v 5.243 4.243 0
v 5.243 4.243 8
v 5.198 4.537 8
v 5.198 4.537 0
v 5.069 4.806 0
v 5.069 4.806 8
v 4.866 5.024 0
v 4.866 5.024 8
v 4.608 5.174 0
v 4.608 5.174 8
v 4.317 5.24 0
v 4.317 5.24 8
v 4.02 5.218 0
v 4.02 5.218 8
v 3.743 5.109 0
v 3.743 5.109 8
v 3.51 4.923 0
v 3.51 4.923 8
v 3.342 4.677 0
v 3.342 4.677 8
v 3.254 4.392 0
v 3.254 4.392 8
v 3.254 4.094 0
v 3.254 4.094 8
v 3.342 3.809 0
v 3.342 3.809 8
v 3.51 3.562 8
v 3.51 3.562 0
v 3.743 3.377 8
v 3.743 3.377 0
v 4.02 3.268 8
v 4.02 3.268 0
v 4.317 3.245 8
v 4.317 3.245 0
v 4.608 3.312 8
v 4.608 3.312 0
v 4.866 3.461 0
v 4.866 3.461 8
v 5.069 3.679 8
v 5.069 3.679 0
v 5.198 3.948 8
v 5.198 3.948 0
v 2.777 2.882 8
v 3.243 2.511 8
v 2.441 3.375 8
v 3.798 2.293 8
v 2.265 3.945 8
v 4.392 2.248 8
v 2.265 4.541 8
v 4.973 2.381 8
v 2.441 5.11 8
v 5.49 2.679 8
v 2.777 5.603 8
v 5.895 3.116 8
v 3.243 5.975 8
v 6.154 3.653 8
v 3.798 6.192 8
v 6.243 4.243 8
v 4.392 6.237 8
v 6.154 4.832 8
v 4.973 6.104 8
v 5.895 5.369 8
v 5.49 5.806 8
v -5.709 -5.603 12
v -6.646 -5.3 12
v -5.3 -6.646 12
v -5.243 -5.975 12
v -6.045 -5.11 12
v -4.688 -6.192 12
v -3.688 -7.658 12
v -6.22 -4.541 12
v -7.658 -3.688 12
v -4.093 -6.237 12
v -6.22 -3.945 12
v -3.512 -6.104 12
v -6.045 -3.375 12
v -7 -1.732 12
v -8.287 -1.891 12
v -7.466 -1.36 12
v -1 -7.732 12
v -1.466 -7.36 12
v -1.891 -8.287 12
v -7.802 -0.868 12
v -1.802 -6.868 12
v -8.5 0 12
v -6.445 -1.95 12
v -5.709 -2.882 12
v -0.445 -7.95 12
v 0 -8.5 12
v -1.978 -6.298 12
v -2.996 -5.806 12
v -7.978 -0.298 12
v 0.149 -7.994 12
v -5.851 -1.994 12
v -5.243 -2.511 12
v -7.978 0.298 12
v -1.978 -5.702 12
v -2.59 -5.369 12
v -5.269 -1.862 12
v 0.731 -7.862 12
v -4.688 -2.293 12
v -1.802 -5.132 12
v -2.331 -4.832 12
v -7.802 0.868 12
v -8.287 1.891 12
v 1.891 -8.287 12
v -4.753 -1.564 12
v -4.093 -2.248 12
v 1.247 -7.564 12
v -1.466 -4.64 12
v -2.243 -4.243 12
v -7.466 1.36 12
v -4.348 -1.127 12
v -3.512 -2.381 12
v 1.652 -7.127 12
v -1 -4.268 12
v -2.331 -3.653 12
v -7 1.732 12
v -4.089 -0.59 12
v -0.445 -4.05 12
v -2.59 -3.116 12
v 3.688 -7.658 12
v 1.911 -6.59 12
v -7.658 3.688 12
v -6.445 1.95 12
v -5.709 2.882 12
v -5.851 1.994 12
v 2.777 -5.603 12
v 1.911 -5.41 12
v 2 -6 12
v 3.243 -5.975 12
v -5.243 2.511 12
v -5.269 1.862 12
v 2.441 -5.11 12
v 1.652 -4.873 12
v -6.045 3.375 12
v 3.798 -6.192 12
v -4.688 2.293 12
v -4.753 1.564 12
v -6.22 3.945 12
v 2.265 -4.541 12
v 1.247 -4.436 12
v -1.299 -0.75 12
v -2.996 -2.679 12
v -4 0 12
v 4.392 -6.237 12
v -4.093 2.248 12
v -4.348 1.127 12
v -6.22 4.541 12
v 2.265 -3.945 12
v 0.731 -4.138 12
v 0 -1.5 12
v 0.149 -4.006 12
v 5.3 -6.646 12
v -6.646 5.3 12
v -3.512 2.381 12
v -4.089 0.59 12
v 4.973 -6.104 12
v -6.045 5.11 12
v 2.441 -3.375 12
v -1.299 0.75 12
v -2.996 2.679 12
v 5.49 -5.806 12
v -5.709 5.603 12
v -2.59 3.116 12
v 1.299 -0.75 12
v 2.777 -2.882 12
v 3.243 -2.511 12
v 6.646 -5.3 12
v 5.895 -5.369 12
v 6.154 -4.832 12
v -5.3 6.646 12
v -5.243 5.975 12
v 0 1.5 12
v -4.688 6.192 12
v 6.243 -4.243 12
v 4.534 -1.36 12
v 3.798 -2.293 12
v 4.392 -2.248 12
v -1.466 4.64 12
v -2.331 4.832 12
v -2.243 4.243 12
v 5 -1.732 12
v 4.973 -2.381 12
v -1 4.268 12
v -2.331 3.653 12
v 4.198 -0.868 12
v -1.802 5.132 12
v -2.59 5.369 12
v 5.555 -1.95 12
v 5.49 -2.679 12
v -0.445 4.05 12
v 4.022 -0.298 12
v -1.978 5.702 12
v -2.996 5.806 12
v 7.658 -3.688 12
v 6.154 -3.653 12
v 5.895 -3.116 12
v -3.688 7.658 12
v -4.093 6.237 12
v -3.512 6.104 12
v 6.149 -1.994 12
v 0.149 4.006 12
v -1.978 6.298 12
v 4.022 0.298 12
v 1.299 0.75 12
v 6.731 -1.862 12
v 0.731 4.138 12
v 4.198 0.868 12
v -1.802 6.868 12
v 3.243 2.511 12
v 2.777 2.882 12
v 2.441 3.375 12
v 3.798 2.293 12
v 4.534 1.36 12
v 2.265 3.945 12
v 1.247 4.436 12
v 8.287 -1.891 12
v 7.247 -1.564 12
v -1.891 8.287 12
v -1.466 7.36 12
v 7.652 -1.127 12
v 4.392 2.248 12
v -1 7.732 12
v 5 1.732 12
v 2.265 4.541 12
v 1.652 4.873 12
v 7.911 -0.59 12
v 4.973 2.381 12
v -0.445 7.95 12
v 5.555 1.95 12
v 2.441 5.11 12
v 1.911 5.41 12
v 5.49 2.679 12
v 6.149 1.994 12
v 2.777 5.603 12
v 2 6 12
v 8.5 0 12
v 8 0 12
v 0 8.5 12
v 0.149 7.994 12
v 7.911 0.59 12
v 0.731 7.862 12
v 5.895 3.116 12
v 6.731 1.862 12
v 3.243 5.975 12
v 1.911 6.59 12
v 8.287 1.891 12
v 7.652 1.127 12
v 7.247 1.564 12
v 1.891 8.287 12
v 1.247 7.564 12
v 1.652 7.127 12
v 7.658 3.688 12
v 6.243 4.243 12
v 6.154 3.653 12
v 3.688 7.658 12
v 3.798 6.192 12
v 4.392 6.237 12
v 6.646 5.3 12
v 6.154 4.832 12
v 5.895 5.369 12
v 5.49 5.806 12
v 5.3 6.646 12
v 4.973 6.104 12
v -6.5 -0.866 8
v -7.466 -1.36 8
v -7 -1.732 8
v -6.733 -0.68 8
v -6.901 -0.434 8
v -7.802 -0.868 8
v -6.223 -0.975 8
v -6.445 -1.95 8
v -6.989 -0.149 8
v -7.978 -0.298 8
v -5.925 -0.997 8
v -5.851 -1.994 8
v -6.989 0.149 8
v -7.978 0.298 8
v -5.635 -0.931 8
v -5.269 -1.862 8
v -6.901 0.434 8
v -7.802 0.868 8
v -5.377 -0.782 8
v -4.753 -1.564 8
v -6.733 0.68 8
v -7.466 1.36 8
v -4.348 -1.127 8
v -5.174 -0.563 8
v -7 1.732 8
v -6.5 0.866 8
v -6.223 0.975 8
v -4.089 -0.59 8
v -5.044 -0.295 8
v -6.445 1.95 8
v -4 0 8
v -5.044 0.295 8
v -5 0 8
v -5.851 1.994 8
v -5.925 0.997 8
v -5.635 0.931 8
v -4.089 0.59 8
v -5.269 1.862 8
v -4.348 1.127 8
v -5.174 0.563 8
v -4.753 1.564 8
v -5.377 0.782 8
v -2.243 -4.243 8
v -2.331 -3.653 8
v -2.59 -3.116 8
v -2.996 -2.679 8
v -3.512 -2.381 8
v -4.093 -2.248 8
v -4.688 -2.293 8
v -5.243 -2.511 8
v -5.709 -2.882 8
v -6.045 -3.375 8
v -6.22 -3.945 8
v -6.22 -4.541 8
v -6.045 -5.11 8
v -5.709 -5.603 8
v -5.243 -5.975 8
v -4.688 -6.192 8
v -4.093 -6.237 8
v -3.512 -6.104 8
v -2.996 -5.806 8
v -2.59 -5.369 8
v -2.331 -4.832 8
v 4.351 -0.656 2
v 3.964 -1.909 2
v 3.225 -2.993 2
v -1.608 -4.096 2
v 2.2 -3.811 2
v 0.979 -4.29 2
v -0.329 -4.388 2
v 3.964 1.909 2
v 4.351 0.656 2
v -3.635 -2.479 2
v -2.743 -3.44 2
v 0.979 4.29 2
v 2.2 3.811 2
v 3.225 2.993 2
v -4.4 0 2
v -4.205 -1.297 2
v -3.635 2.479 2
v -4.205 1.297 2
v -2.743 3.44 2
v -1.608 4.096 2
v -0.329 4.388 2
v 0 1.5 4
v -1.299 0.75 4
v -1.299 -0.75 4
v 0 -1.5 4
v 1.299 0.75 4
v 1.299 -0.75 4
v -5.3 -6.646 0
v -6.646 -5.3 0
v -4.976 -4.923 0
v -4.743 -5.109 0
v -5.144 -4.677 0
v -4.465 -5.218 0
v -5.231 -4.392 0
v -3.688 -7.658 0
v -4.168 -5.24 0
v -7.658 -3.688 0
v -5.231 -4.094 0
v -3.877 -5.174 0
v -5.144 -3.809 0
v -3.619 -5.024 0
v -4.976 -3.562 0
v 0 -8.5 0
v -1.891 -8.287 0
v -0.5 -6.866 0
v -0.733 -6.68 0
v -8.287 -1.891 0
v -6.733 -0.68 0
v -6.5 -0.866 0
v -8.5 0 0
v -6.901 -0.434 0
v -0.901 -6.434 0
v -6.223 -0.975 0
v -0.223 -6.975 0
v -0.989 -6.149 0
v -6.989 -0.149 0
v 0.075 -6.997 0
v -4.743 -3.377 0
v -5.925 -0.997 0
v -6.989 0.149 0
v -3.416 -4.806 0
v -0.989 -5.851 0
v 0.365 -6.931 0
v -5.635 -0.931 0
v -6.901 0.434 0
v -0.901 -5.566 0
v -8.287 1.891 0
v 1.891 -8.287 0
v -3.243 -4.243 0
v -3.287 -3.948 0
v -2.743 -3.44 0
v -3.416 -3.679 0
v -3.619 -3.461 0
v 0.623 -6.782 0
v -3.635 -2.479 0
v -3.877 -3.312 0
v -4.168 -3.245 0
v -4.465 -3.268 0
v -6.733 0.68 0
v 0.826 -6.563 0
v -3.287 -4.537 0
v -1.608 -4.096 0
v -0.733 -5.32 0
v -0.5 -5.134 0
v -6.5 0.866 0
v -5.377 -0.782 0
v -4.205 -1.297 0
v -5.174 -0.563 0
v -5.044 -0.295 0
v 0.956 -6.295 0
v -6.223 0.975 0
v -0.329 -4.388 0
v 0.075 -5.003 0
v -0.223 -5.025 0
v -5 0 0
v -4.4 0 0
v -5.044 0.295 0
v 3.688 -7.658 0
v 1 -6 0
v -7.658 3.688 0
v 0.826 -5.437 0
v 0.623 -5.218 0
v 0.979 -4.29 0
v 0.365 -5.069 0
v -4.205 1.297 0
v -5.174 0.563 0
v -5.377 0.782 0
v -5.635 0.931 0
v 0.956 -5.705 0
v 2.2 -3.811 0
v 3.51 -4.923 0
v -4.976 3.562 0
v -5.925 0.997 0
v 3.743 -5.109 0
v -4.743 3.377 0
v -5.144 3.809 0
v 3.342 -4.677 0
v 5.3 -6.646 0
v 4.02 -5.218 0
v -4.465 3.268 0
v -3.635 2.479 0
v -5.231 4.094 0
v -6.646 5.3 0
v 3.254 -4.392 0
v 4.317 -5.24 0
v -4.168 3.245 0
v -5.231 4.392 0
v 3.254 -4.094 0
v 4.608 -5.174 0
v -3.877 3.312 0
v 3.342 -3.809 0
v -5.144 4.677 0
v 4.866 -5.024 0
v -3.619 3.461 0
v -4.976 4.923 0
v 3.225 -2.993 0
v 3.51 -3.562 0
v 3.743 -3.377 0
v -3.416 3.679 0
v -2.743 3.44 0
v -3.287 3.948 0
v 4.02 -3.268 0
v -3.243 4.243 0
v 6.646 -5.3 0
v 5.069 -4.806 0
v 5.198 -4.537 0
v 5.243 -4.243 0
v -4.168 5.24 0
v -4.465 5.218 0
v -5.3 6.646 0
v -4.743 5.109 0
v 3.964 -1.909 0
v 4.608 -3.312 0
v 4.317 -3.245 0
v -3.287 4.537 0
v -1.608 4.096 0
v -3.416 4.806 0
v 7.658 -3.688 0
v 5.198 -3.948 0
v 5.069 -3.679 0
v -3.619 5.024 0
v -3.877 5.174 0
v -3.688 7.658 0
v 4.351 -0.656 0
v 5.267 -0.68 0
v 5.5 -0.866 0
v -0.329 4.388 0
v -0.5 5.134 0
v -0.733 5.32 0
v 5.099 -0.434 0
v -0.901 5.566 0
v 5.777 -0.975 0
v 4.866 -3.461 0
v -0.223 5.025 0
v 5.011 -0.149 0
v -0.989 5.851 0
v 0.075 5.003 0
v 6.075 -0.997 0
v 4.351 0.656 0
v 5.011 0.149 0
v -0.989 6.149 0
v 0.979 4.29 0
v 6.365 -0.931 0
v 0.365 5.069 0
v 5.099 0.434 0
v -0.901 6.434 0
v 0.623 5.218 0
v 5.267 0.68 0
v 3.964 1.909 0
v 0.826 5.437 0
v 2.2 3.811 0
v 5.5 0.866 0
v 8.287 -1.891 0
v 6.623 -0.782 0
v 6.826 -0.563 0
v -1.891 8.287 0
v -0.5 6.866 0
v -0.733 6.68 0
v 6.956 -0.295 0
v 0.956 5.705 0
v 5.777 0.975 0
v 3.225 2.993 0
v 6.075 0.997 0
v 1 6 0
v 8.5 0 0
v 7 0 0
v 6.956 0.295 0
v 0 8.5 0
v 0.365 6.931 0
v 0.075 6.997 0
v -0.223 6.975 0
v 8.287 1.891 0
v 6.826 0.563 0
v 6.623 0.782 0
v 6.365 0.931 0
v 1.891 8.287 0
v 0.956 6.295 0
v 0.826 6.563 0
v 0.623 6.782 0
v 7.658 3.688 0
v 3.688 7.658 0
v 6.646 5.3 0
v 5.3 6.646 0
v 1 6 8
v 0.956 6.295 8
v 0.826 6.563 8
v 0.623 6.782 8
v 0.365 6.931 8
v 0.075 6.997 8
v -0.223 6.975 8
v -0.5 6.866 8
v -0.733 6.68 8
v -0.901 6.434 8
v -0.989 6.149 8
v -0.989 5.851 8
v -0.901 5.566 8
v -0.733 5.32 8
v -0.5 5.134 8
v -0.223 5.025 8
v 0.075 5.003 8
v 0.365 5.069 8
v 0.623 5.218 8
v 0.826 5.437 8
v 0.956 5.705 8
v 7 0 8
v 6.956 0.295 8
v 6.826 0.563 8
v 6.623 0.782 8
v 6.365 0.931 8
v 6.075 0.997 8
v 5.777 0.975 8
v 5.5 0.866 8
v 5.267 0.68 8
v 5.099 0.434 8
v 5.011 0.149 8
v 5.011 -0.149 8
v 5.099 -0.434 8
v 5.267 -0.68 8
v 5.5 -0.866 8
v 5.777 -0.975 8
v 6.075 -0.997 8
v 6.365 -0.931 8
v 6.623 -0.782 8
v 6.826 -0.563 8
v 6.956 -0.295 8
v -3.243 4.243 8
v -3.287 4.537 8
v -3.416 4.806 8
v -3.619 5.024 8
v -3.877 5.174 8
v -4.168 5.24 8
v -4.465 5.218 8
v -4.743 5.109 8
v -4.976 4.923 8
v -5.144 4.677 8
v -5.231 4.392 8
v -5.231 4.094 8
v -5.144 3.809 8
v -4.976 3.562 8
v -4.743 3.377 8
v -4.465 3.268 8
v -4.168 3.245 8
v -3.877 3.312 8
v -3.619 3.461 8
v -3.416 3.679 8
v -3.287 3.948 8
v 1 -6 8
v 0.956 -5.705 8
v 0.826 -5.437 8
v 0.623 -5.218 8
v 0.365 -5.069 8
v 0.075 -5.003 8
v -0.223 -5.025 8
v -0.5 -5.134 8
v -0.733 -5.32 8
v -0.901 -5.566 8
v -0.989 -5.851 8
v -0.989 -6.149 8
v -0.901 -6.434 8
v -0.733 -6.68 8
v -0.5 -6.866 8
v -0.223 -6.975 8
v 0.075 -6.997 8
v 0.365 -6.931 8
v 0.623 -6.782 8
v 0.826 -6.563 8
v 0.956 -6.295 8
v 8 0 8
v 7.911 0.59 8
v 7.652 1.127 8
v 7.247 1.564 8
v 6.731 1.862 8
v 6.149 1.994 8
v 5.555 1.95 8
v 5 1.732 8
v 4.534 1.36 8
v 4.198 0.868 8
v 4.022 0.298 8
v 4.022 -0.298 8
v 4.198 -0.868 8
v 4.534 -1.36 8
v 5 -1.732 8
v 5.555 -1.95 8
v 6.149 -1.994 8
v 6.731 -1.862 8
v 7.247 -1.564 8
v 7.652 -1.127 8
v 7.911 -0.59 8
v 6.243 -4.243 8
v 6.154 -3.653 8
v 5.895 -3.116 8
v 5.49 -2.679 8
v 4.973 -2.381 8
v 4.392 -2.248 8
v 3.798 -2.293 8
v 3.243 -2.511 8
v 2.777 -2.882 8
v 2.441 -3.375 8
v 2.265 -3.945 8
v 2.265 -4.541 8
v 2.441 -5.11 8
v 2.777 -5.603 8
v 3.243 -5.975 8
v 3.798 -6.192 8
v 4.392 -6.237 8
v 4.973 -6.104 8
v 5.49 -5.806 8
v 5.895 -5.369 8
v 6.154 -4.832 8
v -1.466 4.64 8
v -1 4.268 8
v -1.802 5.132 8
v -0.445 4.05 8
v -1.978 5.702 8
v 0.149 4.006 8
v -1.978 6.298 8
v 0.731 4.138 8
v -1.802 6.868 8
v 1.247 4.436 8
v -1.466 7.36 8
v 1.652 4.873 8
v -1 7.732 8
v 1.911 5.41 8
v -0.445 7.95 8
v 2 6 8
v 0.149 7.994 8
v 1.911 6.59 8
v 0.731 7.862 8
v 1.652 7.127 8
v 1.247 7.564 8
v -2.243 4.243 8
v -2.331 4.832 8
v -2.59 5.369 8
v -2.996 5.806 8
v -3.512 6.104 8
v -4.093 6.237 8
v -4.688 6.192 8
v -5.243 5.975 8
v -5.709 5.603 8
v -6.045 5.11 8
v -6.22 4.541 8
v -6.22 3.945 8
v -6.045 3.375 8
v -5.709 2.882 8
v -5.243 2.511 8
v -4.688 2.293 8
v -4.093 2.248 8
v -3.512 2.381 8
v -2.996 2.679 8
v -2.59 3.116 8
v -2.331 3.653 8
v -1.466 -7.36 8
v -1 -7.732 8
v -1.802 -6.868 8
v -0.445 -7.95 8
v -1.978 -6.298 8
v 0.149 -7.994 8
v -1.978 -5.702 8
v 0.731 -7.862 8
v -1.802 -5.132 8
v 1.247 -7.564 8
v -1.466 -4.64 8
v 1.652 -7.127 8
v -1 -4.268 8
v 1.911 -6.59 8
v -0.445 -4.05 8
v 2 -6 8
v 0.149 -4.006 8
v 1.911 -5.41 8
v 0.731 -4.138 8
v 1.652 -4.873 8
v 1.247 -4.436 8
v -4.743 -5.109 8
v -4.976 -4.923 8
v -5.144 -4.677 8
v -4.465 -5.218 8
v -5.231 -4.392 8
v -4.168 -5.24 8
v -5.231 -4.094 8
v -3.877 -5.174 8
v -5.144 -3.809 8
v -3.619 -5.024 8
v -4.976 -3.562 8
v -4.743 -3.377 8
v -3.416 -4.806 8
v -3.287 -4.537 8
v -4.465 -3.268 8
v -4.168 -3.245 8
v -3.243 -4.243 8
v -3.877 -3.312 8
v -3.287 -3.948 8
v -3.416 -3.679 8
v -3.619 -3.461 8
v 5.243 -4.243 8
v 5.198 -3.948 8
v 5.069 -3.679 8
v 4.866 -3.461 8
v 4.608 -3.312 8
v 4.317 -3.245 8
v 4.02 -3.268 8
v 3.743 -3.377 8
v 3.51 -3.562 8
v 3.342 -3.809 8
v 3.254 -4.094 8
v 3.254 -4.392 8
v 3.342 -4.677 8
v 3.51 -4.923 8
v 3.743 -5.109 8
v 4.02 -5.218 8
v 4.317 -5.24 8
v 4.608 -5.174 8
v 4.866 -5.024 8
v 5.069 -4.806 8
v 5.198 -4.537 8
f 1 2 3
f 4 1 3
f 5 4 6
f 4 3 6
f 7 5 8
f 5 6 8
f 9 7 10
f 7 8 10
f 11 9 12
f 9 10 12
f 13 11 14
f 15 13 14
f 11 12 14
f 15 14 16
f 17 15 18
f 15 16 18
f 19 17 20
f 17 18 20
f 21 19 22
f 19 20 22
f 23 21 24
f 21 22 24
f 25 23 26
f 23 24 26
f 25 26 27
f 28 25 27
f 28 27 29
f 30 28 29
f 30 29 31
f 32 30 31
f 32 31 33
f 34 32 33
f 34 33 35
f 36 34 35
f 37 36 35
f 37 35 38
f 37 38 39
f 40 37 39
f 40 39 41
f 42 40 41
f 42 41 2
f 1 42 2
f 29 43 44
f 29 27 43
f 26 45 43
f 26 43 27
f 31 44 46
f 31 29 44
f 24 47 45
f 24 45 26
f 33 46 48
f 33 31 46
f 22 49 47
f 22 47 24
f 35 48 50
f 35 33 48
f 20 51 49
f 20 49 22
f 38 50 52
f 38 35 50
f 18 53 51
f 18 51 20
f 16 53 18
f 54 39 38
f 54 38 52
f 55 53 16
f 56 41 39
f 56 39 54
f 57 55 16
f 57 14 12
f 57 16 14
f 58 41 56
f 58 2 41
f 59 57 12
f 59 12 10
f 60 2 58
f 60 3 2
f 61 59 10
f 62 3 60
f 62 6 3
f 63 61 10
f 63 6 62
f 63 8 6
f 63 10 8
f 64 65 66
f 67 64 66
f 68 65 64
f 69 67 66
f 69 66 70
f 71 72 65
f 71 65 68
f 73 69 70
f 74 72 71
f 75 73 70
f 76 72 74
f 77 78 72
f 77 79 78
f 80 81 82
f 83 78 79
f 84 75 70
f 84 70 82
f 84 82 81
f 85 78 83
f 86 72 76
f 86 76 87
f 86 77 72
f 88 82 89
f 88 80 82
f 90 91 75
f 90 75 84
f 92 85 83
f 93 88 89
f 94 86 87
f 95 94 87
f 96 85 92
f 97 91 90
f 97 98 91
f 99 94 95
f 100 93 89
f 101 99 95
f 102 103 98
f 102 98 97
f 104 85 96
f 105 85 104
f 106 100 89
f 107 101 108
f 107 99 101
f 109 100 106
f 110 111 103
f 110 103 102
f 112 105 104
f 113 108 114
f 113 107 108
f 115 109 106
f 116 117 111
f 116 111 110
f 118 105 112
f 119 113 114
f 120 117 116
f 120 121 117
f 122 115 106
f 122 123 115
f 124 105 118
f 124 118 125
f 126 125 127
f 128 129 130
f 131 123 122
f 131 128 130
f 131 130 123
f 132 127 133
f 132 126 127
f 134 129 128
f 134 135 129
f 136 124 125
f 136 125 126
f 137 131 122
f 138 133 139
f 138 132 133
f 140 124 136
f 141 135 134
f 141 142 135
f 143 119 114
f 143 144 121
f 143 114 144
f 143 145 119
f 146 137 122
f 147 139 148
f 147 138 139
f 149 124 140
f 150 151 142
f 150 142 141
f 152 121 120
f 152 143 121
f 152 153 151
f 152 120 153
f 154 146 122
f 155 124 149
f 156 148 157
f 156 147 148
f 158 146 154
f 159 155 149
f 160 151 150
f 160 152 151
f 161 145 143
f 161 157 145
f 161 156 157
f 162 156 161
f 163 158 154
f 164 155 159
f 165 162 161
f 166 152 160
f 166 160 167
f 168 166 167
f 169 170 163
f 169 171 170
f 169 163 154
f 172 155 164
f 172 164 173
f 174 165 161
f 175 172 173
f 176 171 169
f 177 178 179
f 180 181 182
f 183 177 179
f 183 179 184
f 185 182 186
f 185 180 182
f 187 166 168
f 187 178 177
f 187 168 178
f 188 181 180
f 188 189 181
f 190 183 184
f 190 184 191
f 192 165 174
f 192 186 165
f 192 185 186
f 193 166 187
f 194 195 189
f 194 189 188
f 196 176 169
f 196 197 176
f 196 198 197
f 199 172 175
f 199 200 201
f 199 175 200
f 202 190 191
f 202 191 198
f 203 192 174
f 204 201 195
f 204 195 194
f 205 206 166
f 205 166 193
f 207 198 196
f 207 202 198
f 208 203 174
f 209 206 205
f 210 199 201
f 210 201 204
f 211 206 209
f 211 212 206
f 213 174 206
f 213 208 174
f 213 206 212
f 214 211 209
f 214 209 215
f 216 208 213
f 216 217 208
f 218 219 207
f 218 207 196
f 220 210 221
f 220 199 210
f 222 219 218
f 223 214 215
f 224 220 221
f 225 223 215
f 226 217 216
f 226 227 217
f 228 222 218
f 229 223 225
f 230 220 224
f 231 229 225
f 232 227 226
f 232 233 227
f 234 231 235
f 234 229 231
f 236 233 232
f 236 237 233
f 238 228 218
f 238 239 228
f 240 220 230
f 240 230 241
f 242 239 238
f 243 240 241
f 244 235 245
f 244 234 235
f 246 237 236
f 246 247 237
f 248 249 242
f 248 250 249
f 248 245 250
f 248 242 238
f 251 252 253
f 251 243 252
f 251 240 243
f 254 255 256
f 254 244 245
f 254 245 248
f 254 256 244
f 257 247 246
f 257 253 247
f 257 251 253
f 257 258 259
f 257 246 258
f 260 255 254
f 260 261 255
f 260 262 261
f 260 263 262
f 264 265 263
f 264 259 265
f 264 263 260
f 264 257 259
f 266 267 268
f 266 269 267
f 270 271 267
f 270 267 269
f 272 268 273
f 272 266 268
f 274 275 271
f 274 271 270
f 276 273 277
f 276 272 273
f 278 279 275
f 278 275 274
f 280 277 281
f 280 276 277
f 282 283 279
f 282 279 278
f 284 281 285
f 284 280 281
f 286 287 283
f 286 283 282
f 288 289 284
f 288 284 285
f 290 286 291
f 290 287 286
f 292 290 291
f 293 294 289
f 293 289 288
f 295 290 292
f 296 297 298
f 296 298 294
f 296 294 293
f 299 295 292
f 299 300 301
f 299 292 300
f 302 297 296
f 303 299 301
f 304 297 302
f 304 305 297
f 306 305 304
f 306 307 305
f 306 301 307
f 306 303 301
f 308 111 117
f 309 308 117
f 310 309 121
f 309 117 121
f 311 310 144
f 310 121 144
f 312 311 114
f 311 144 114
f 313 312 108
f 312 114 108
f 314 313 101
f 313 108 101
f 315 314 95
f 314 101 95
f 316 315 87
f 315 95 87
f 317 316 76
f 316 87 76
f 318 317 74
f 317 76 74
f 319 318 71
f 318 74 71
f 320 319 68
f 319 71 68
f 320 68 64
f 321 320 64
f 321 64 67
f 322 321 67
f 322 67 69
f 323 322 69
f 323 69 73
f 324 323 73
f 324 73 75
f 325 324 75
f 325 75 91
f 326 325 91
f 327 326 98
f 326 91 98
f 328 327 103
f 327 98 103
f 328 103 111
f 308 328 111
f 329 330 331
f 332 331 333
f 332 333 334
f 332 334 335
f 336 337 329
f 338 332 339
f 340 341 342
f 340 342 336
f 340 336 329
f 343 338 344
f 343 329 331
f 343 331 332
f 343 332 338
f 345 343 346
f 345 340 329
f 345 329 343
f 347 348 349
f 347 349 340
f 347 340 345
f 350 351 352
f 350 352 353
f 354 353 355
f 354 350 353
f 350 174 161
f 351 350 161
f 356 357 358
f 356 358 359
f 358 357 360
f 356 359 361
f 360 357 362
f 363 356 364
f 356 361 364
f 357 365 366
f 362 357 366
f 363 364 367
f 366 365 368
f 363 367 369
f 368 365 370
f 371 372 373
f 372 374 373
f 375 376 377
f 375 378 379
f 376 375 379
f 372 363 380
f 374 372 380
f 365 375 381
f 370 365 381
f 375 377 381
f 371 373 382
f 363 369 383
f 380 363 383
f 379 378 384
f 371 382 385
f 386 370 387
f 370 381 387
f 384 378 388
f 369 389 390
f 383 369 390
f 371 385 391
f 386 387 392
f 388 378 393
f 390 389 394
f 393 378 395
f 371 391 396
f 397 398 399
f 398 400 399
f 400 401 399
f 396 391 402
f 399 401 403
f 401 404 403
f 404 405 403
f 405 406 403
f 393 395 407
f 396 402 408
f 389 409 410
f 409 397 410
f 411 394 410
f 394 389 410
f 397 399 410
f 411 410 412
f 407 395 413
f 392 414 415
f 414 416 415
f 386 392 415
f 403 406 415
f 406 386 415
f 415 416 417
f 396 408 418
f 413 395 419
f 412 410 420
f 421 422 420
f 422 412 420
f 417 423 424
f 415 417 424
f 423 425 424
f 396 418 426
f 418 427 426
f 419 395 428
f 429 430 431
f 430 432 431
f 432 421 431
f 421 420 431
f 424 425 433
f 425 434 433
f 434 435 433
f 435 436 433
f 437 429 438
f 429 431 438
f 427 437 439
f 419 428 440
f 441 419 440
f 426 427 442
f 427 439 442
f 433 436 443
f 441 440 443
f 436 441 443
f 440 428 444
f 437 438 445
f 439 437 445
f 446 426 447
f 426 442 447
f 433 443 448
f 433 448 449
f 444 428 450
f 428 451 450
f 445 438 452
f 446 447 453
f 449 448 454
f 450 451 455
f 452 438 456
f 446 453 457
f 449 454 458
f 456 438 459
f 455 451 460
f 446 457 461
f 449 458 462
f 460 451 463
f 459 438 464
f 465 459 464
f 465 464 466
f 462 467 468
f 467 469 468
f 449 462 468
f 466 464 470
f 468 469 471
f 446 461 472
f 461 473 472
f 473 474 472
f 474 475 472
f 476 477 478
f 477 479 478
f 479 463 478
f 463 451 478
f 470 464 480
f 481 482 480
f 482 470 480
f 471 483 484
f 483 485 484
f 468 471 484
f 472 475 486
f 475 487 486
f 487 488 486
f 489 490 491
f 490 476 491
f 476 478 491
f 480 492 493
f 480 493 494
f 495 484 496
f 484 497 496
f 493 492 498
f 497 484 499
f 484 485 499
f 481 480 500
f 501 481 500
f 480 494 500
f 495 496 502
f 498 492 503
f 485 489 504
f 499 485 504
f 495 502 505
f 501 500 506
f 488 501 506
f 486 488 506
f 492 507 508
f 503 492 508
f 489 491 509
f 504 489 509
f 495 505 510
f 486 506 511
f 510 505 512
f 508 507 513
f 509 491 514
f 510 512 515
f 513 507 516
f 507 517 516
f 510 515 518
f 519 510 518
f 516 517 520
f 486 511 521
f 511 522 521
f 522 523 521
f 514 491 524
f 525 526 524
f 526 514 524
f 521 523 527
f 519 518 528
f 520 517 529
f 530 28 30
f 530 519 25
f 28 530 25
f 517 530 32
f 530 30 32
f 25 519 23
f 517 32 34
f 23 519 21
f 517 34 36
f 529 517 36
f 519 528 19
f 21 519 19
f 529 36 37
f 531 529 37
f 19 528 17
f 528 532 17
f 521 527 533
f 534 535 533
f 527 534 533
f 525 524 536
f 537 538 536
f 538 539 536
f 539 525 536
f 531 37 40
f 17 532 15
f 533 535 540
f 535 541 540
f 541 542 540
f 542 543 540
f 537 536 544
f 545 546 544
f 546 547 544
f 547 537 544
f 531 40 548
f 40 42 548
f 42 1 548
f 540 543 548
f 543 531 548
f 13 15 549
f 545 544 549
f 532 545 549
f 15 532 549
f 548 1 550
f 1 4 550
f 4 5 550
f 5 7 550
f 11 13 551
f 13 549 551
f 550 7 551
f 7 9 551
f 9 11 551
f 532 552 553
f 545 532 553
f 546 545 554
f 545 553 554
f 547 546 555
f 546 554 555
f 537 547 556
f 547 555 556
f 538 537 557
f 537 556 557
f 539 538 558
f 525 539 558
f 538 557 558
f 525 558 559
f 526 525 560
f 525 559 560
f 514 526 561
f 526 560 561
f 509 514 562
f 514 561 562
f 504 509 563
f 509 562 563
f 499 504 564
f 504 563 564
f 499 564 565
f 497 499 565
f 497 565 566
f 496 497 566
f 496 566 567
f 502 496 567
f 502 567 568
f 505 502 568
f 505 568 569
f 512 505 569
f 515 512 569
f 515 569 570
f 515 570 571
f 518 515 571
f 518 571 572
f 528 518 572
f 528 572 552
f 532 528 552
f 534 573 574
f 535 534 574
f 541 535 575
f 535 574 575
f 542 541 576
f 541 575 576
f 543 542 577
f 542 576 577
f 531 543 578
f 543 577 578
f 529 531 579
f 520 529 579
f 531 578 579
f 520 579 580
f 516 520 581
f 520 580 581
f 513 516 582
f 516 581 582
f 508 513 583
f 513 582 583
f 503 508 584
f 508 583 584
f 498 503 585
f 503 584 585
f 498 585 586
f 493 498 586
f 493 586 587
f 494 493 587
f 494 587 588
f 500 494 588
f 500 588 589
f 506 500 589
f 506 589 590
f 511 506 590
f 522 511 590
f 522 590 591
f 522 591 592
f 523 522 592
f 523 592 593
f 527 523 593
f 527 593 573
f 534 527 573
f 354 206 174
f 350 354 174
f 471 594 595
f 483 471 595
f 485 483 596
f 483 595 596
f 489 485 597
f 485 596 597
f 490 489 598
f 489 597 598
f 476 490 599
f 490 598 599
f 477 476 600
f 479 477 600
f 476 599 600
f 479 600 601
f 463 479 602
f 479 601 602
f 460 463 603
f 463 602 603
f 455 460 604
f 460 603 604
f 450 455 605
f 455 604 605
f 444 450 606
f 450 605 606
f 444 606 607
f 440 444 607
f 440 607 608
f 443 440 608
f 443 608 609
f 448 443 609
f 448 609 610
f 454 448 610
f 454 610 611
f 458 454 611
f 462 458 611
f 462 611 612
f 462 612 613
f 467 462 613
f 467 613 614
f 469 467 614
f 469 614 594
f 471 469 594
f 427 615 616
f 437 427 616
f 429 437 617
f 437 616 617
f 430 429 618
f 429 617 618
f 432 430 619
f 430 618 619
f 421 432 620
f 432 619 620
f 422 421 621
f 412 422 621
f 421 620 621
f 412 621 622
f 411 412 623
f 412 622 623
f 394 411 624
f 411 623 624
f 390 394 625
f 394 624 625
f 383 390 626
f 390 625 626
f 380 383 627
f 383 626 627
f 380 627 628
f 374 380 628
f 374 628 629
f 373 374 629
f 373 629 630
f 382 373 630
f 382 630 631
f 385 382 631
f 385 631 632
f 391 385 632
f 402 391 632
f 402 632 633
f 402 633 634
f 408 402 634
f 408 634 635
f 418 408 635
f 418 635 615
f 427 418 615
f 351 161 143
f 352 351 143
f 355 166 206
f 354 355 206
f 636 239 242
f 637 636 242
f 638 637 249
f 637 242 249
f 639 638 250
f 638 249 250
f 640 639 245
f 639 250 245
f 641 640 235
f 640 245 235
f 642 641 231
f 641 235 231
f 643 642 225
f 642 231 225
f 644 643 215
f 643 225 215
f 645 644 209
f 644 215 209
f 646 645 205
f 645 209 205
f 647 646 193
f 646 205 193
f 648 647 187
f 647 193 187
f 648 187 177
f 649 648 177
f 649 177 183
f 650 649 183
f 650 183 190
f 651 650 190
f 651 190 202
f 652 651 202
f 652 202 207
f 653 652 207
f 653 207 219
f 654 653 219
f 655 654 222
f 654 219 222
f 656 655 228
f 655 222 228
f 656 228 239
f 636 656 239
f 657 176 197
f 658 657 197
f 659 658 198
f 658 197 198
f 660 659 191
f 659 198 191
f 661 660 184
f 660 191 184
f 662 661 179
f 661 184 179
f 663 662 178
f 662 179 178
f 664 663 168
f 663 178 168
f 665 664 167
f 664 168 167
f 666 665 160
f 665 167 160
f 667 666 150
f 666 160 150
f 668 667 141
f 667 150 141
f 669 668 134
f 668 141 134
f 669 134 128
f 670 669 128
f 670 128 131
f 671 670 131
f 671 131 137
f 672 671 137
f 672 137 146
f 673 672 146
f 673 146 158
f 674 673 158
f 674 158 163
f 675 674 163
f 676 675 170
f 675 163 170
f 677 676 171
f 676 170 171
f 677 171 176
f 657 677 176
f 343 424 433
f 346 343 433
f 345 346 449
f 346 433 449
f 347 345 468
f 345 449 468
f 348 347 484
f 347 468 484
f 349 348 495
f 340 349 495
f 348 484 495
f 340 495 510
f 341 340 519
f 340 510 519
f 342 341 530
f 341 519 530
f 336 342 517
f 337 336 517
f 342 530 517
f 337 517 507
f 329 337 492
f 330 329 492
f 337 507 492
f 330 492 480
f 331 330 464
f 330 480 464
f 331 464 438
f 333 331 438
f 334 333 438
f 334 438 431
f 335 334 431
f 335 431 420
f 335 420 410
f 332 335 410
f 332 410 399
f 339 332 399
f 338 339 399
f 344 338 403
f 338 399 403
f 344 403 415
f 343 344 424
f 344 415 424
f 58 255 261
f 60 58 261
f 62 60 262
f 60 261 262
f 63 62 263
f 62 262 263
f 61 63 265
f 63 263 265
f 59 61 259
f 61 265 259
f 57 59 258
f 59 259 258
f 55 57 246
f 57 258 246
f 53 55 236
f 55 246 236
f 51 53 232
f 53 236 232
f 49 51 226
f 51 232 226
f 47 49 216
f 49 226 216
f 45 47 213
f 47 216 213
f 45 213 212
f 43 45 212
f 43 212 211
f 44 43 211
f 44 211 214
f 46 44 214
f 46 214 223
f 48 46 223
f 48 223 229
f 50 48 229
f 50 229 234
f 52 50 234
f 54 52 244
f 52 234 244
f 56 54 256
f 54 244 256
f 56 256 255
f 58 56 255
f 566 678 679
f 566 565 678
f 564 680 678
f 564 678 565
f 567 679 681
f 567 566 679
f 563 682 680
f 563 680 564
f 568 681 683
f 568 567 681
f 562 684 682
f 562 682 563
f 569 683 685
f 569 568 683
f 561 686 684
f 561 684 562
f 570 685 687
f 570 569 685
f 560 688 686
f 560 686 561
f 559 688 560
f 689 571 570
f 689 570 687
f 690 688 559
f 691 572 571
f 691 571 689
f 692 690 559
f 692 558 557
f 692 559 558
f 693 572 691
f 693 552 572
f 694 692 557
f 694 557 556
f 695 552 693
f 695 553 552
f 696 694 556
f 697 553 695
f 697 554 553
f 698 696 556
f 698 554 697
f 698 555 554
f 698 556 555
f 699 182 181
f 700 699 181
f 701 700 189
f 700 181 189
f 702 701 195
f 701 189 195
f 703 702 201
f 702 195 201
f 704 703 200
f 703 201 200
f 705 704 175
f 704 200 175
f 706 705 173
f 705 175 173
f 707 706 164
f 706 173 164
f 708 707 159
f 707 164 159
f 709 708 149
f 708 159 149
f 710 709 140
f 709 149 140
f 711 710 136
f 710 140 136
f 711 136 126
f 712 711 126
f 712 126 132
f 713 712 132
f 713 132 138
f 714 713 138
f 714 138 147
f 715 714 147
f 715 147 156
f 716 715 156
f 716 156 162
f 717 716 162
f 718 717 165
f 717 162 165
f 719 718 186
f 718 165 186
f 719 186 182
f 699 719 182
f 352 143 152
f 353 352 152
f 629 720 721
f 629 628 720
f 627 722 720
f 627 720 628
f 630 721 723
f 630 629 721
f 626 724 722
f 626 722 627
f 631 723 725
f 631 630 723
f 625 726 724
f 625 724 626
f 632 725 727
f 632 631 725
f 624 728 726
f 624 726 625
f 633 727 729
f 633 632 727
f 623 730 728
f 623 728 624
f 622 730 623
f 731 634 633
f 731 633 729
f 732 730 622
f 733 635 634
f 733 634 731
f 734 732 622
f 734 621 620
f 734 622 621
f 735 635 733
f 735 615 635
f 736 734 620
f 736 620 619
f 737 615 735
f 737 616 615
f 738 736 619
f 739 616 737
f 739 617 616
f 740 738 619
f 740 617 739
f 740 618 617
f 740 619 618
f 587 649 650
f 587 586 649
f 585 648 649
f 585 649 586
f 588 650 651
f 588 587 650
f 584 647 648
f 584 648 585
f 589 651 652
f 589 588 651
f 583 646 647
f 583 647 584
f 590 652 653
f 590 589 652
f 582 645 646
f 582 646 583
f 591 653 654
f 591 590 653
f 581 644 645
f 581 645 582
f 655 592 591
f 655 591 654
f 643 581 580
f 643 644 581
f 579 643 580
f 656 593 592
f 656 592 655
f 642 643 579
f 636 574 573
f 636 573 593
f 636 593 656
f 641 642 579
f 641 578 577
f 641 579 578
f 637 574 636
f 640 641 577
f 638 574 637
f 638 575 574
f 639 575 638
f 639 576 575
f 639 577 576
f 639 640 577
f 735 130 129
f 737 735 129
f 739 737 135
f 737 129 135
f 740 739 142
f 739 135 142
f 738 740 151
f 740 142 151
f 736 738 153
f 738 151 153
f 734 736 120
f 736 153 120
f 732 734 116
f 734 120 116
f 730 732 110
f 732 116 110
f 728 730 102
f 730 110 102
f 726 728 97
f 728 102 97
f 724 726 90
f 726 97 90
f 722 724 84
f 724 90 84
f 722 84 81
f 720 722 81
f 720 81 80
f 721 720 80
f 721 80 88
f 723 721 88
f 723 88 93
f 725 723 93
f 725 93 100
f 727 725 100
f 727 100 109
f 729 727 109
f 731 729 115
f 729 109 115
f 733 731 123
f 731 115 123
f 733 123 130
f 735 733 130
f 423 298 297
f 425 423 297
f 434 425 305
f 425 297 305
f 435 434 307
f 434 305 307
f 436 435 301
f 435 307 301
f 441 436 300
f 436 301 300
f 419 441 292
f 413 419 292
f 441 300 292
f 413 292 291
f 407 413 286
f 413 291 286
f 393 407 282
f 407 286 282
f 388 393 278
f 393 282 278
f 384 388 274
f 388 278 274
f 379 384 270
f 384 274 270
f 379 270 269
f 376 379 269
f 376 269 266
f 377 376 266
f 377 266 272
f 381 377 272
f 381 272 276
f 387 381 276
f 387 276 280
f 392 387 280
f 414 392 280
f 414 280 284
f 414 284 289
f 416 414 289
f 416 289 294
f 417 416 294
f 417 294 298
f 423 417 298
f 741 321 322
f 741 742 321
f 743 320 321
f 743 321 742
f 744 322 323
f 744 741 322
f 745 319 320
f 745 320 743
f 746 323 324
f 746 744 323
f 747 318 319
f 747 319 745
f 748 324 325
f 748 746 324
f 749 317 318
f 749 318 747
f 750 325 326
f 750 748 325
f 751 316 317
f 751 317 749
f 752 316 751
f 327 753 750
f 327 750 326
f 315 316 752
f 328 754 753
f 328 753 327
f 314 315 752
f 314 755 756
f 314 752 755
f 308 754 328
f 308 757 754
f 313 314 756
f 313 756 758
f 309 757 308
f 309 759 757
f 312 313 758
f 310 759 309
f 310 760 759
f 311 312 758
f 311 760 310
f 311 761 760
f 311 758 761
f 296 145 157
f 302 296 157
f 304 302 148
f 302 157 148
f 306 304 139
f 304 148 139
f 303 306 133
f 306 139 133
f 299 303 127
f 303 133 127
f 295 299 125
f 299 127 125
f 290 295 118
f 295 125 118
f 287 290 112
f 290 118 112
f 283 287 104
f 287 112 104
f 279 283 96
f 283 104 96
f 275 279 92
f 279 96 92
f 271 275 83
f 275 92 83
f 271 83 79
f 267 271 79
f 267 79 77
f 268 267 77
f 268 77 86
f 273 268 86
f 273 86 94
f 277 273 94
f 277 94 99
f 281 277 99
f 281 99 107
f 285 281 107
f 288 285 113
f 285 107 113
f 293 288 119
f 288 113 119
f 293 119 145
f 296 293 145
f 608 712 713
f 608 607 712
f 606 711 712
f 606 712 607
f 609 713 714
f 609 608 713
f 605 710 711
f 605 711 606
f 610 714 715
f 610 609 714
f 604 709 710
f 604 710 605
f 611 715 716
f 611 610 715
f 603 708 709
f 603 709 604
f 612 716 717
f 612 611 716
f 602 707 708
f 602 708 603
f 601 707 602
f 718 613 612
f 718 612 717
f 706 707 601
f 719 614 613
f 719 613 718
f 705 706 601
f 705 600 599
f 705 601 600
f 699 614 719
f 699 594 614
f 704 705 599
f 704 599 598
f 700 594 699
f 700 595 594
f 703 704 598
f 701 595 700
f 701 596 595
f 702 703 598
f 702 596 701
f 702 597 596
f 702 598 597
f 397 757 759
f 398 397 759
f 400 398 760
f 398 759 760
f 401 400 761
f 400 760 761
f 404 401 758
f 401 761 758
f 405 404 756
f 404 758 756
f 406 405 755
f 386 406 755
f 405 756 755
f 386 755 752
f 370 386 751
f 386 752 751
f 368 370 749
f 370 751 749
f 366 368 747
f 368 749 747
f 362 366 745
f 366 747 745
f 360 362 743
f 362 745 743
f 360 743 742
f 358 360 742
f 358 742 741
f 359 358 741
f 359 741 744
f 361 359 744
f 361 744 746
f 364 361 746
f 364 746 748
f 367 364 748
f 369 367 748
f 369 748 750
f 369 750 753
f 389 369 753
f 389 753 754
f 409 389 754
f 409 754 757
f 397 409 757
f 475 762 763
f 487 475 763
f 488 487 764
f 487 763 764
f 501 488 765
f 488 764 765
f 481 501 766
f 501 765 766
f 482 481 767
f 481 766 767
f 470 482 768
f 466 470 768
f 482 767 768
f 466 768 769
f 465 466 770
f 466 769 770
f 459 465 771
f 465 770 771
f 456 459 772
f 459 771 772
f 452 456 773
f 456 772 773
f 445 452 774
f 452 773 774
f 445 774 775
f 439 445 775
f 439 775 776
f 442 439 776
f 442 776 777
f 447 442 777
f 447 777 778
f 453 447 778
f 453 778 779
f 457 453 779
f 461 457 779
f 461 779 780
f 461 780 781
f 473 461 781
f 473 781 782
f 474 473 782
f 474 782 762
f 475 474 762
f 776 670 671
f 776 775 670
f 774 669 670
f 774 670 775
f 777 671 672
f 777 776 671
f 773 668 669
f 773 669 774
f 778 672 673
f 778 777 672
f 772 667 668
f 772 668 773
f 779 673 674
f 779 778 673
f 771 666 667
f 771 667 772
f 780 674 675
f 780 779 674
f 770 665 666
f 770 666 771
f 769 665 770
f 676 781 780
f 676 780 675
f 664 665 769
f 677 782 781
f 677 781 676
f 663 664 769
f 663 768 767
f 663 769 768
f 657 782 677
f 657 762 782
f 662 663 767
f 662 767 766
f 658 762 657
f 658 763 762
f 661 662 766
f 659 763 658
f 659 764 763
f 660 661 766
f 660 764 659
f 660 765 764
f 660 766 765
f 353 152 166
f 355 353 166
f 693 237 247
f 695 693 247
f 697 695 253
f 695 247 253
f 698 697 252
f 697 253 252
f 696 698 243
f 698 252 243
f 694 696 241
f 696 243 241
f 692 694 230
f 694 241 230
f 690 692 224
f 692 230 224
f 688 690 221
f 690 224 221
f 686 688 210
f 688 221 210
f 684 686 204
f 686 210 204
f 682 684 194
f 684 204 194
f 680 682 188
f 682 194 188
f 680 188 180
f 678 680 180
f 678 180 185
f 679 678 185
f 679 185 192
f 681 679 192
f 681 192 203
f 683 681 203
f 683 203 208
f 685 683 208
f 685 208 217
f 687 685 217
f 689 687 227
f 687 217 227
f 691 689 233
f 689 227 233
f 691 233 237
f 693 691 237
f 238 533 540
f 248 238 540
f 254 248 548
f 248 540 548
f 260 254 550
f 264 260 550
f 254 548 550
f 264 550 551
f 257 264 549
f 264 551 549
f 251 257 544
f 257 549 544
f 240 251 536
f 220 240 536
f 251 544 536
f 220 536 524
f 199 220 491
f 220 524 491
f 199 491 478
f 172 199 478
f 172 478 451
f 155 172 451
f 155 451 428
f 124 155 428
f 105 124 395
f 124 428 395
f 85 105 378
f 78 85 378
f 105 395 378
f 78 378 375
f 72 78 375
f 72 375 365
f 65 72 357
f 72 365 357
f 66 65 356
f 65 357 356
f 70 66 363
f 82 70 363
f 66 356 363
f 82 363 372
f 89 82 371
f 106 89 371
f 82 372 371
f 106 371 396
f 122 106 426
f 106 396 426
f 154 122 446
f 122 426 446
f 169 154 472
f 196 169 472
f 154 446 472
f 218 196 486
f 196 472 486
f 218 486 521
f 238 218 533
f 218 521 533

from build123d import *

# Parameters (mm, degrees)
SKETCH_1_R          = 8.5
EXTRUDE_1_DEPTH     = 12
SKETCH_2_R          = 1
CUT_EXTRUDE_1_DEPTH = 20
CUT_EXTRUDE_2_DEPTH = 8
SKETCH_4_R          = 4.4
CUT_EXTRUDE_3_DEPTH = 2
SKETCH_5_R          = 2
CUT_EXTRUDE_4_DEPTH = 4


with BuildPart() as part:
    # ｽｹｯﾁ1 → ﾎﾞｽ - 押し出し1 (new body)
    with BuildSketch(Plane.XY):
        Circle(SKETCH_1_R)
    extrude(amount=EXTRUDE_1_DEPTH)

    # ｽｹｯﾁ2 → ｶｯﾄ - 押し出し1 (cut)
    with BuildSketch(Plane.XY.offset(12)):
        with Locations((0, 6)):
            Circle(SKETCH_2_R)
        with Locations((4.242640687, 4.242640687)):
            Circle(SKETCH_2_R)
        with Locations((6, 0)):
            Circle(SKETCH_2_R)
        with Locations((4.242640687, -4.242640687)):
            Circle(SKETCH_2_R)
        with Locations((0, -6)):
            Circle(SKETCH_2_R)
        with Locations((-4.242640687, -4.242640687)):
            Circle(SKETCH_2_R)
        with Locations((-6, 0)):
            Circle(SKETCH_2_R)
        with Locations((-4.242640687, 4.242640687)):
            Circle(SKETCH_2_R)
    extrude(amount=-CUT_EXTRUDE_1_DEPTH, mode=Mode.SUBTRACT)

    # ｽｹｯﾁ3 → ｶｯﾄ - 押し出し2 (cut)
    with BuildSketch(Plane.XY.offset(12)):
        Polygon((0, 1.5), (-1.299038106, 0.75), (-1.299038106, -0.75), (0, -1.5), (1.299038106, -0.75), (1.299038106, 0.75), align=None)
    extrude(amount=-CUT_EXTRUDE_2_DEPTH, mode=Mode.SUBTRACT)

    # ｽｹｯﾁ4 → ｶｯﾄ - 押し出し3 (cut)
    with BuildSketch(Plane(origin=(0, 0, 0), x_dir=(-1, 0, 0), z_dir=(0, 0, -1))):
        Circle(SKETCH_4_R)
    extrude(amount=-CUT_EXTRUDE_3_DEPTH, mode=Mode.SUBTRACT)

    # ｽｹｯﾁ5 → ｶｯﾄ - 押し出し4 (cut)
    with BuildSketch(Plane.XY.offset(12)):
        with Locations((0, 6)):
            Circle(SKETCH_5_R)
        with Locations((4.242640687, 4.242640687)):
            Circle(SKETCH_5_R)
        with Locations((6, 0)):
            Circle(SKETCH_5_R)
        with Locations((4.242640687, -4.242640687)):
            Circle(SKETCH_5_R)
        with Locations((0, -6)):
            Circle(SKETCH_5_R)
        with Locations((-4.242640687, -4.242640687)):
            Circle(SKETCH_5_R)
        with Locations((-6, 0)):
            Circle(SKETCH_5_R)
        with Locations((-4.242640687, 4.242640687)):
            Circle(SKETCH_5_R)
    extrude(amount=-CUT_EXTRUDE_4_DEPTH, mode=Mode.SUBTRACT)


solid = part.part
